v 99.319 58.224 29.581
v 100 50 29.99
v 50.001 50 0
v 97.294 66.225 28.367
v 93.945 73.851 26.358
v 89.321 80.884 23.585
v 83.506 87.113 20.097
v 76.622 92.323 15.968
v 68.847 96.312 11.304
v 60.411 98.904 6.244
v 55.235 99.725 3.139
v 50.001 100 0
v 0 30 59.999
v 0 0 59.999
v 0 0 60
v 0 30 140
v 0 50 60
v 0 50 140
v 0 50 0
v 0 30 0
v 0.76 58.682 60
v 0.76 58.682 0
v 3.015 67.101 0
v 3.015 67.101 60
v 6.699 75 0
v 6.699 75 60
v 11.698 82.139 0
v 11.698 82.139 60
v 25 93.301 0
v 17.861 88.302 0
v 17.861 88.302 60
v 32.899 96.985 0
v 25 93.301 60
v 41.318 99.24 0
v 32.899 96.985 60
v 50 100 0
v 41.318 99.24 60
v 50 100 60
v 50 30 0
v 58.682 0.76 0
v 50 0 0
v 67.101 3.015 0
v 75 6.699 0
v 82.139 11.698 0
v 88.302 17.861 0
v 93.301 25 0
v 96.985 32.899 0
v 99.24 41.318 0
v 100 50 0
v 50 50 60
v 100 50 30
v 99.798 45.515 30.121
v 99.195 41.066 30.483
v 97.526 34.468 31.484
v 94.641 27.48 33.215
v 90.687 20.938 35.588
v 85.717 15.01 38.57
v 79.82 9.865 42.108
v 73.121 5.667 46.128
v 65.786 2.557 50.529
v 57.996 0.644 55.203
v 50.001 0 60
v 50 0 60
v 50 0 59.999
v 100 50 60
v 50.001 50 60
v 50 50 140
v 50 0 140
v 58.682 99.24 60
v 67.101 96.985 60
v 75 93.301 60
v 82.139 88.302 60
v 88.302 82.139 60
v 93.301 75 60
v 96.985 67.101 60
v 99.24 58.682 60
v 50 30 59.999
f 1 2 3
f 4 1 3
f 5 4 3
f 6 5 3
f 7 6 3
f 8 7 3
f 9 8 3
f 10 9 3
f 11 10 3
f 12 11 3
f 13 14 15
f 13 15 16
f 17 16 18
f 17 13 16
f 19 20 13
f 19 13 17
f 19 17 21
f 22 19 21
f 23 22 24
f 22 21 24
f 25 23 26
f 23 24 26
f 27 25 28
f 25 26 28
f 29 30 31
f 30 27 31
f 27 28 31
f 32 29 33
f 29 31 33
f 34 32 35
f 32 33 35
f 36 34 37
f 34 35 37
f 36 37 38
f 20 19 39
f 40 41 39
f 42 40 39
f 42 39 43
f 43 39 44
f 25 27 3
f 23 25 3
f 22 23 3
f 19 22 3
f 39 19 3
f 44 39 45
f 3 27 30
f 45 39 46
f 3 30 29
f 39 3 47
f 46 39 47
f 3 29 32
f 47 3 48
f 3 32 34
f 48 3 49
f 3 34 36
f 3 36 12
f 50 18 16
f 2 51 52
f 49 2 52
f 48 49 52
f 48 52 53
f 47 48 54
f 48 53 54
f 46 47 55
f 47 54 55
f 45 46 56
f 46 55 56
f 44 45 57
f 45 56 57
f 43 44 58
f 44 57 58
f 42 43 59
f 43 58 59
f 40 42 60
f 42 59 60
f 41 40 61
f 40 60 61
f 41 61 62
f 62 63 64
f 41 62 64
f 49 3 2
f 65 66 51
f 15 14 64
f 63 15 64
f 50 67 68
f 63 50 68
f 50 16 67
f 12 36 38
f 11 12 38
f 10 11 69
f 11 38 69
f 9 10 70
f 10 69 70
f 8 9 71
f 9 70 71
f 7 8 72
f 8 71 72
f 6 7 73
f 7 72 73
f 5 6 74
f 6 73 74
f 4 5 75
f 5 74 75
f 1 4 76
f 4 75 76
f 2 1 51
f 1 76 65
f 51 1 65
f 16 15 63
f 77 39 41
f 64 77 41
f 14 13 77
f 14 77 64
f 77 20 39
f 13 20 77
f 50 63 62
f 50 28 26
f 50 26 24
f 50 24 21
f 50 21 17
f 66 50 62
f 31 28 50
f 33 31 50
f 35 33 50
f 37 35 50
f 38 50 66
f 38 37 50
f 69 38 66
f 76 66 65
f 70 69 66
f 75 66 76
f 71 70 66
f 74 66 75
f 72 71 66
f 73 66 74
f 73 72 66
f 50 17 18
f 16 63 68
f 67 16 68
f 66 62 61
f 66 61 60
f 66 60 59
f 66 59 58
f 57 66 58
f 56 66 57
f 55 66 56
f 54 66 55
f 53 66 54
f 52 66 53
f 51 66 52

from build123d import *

# Parameters (mm, degrees)
F0_W      = 100
F0_H      = 100
F1_DEPTH  = 140
F3_DEPTH  = 140.001
F5_DEPTH  = 80
F7_W      = 50
F7_H      = 80
F13_DEPTH = 50.00099999
F15_DEPTH = 50.00099999
F16_W     = 30
F16_H     = 59.999
F17_DEPTH = 50


with BuildPart() as f1:
    # F0 (on Top) → F1 (new body)
    with BuildSketch(Plane.XY):
        with Locations((50, 50)):
            Rectangle(F0_W, F0_H)
    extrude(amount=F1_DEPTH)

    # F2 (on face) → F3 (cut, through all)
    with BuildSketch(Plane.XY.offset(140)):
        with BuildLine():
            ThreePointArc((0, 50), (14.6446609407, 85.3553390593), (50, 100))
            Line((50, 100), (0, 100))
            Line((0, 100), (0, 50))
        make_face()
        with BuildLine():
            ThreePointArc((50, 100), (85.3553390593, 85.3553390593), (100, 50))
            Line((100, 50), (100, 100))
            Line((100, 100), (50, 100))
        make_face()
        with BuildLine():
            Line((100, 0), (100, 50))
            ThreePointArc((100, 50), (85.3553390593, 14.6446609407), (50, 0))
            Line((50, 0), (100, 0))
        make_face()
    extrude(amount=-F3_DEPTH, mode=Mode.SUBTRACT)

    # F4 (on face) → F5 (cut)
    with BuildSketch(Plane.XY.offset(140)):
        with BuildLine():
            Line((50, 50), (50, 0))
            ThreePointArc((50, 0), (85.3553390593, 14.6446609407), (100, 50))
            ThreePointArc((100, 50), (50, 100), (0, 50))
            Line((0, 50), (50, 50))
        make_face()
    extrude(amount=-F5_DEPTH, mode=Mode.SUBTRACT)

    # F7 (on face) → F9 section 0
    with BuildSketch(Plane.XZ, mode=Mode.PRIVATE) as f9_s0:
        with Locations((25, 100)):
            Rectangle(F7_W, F7_H)
    loft([f9_s0.sketch, Vertex(0, 30, 140)], mode=Mode.SUBTRACT)

    # F6 (on face) → F10 section 0
    with BuildSketch(Plane.XY.offset(140), mode=Mode.PRIVATE) as f10_s0:
        Polygon((0, 30), (50, 50), (0, 50), align=None)
    loft([f10_s0.sketch, Vertex(50, 50, 60)], mode=Mode.SUBTRACT)

    # F12 (on 3pt) → F13 (cut, through all)
    with BuildSketch(Plane.XZ.offset(-50)):
        Polygon((100, 60), (50.001, 60), (100, 30), align=None)
    extrude(amount=F13_DEPTH, mode=Mode.SUBTRACT)

    # F14 (on 3pt) → F15 (cut, through all)
    with BuildSketch(Plane.XZ.offset(-50)):
        Polygon((100, 0), (100, 29.99), (50.001, 0), align=None)
    extrude(amount=-F15_DEPTH, mode=Mode.SUBTRACT)

    # F16 (on face) → F17 (cut)
    with BuildSketch(Plane(origin=(0, 0, 0), x_dir=(0, -1, 0), z_dir=(-1, 0, 0))):
        with Locations((-15, 29.9995)):
            Rectangle(F16_W, F16_H)
    extrude(amount=-F17_DEPTH, mode=Mode.SUBTRACT)


solid = f1.part
